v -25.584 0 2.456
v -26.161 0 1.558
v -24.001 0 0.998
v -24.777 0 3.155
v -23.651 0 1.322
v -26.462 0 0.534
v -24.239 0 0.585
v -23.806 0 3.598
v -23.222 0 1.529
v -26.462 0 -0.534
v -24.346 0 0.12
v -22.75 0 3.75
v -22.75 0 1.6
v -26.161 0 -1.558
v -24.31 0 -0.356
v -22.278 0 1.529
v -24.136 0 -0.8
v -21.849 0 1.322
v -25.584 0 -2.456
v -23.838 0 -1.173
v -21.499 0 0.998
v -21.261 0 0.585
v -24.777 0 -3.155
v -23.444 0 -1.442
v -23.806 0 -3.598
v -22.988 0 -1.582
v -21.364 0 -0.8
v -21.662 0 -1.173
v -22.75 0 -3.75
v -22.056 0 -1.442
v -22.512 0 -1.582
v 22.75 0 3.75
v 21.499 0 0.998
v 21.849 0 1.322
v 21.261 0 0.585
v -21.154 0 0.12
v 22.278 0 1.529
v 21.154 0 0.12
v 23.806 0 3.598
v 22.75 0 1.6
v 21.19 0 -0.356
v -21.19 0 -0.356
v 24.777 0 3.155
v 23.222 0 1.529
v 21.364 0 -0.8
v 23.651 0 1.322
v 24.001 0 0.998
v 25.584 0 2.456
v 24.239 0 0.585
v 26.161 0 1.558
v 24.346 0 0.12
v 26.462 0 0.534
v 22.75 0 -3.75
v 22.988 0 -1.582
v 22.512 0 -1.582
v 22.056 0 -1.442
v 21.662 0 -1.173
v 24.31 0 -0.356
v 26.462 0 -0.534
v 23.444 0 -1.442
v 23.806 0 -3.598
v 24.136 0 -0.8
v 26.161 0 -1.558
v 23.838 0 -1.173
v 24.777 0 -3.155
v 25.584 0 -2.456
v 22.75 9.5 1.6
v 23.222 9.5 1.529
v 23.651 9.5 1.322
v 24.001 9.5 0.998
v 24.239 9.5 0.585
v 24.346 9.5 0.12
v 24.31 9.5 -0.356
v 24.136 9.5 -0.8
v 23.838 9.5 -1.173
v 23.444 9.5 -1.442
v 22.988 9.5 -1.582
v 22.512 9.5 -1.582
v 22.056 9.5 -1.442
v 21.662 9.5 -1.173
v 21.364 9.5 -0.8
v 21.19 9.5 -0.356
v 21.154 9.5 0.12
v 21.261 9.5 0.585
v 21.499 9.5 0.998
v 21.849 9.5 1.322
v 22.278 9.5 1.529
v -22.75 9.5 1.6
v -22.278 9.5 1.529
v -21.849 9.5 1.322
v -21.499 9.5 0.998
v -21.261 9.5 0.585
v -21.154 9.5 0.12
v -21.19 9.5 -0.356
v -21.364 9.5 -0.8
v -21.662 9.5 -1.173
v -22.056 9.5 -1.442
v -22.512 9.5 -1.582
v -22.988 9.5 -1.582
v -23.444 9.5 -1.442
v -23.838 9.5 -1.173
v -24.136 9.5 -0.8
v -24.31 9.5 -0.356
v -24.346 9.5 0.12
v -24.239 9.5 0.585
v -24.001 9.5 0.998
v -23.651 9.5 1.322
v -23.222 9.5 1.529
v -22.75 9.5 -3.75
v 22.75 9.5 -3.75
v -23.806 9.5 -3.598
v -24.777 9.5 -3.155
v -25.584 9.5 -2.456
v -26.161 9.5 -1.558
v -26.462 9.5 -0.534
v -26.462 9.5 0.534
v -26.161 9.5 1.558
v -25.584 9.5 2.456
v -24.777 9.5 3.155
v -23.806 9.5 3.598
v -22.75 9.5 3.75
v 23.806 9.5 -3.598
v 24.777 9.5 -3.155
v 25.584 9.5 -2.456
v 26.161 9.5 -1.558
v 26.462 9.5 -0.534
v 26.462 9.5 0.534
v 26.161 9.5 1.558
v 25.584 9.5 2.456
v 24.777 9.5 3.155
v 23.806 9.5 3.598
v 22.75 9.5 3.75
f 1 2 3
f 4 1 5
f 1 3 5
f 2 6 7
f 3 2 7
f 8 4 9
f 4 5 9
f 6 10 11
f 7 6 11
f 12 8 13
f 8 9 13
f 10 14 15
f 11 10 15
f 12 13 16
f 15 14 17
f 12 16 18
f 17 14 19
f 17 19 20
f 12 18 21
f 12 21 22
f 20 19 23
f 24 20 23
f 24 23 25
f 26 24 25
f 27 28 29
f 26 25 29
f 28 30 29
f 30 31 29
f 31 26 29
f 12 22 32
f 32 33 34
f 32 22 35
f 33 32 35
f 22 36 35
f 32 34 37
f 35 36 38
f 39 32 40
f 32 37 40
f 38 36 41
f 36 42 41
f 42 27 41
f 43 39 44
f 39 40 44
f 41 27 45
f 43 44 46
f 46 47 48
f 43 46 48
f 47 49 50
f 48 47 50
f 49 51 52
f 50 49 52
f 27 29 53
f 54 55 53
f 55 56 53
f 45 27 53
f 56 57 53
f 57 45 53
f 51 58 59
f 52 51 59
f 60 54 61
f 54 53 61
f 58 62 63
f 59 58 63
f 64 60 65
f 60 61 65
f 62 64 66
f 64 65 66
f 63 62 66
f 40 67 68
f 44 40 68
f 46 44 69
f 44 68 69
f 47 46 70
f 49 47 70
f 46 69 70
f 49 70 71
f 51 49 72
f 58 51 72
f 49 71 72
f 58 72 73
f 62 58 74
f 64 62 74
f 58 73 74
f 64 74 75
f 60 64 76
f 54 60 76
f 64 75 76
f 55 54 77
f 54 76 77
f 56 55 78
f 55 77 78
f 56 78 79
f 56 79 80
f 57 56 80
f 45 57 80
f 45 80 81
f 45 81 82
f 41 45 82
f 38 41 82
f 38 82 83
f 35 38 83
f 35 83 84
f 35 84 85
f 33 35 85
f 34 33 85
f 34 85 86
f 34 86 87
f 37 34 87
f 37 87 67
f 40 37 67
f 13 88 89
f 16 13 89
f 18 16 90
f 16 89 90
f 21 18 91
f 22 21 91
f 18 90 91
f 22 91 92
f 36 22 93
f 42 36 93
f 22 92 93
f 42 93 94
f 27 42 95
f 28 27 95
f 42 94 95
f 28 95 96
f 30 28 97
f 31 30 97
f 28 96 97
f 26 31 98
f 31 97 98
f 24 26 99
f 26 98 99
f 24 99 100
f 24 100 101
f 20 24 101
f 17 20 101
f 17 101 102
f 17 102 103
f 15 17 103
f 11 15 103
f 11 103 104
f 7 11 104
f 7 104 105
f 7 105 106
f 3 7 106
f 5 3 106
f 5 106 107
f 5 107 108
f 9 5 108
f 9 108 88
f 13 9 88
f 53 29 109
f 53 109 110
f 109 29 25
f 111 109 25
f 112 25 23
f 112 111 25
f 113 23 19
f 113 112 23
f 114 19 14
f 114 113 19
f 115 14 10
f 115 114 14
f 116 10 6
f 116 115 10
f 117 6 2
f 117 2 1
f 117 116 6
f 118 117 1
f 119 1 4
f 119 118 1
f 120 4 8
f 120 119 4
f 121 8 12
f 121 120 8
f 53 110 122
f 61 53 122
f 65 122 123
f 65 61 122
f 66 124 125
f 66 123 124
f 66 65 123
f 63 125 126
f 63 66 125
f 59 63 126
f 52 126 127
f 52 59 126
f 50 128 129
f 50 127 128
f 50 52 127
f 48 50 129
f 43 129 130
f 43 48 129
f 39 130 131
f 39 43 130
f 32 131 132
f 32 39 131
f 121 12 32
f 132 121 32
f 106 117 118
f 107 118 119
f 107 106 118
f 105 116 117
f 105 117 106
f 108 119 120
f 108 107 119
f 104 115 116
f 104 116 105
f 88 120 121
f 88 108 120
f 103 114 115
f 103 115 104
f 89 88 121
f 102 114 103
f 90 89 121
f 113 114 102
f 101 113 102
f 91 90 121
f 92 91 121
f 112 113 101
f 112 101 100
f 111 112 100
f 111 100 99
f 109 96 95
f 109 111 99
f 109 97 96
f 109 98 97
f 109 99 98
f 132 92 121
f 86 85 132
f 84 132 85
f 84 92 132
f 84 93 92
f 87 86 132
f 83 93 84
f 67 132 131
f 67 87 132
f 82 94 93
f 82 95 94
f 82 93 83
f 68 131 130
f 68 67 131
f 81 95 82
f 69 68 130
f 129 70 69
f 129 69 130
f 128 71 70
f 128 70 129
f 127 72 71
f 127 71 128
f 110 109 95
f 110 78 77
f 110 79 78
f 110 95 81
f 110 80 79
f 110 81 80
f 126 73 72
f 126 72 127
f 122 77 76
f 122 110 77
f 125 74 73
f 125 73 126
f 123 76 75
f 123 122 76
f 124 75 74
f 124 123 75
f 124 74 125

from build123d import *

# Parameters (mm, degrees)
CROQUIS1_W              = 53
CROQUIS1_H              = 7.5
SALIENTE_EXTRUIR1_DEPTH = 9.5
REDONDEO1_RADIUS        = 3.75
REDONDEO1_LENGTH        = 9.5
REDONDEO3_RADIUS        = 3.75
REDONDEO3_LENGTH        = 9.5
CROQUIS2_R              = 1.6
CORTAR_EXTRUIR1_DEPTH   = 29.400044014


with BuildPart() as part:
    # Croquis1 → Saliente-Extruir1 (new body)
    with BuildSketch(Plane(origin=(0, 0, 0), x_dir=(1, 0, 0), z_dir=(0, 1, 0))):
        Rectangle(CROQUIS1_W, CROQUIS1_H)
    extrude(amount=SALIENTE_EXTRUIR1_DEPTH)

    # Redondeo1: full round fillet: the end face becomes a half cylinder, R = half its width
    redondeo1_face = Plane((26.5, 4.75, 0), x_dir=(0, -1, 0), z_dir=(1, 0, 0))  # on the end face: x along it, z out of the body
    redondeo1_slab = redondeo1_face.offset(-REDONDEO1_RADIUS / 2) * Box(REDONDEO1_LENGTH, 2 * REDONDEO1_RADIUS, REDONDEO1_RADIUS, mode=Mode.PRIVATE)  # the body's end, R deep
    redondeo1_round = Plane((22.75, 4.75, 0), x_dir=(1, 0, 0), z_dir=(0, -1, 0)) * Cylinder(REDONDEO1_RADIUS, REDONDEO1_LENGTH, mode=Mode.PRIVATE)  # its axis R under the face
    add(redondeo1_slab - redondeo1_round, mode=Mode.SUBTRACT)

    # Redondeo3: full round fillet: the end face becomes a half cylinder, R = half its width
    redondeo3_face = Plane((-26.5, 4.75, 0), x_dir=(0, 1, 0), z_dir=(-1, 0, 0))  # on the end face: x along it, z out of the body
    redondeo3_slab = redondeo3_face.offset(-REDONDEO3_RADIUS / 2) * Box(REDONDEO3_LENGTH, 2 * REDONDEO3_RADIUS, REDONDEO3_RADIUS, mode=Mode.PRIVATE)  # the body's end, R deep
    redondeo3_round = Plane((-22.75, 4.75, 0), x_dir=(-1, 0, 0), z_dir=(0, 1, 0)) * Cylinder(REDONDEO3_RADIUS, REDONDEO3_LENGTH, mode=Mode.PRIVATE)  # its axis R under the face
    add(redondeo3_slab - redondeo3_round, mode=Mode.SUBTRACT)

    # Croquis2 → Cortar-Extruir1 (cut, through all)
    with BuildSketch(Plane(origin=(0, 9.5, 0), x_dir=(1, 0, 0), z_dir=(0, 1, 0))):
        with Locations(Location((-22.75, 0, 0), (0, 0, 270))):
            Circle(CROQUIS2_R)
        with Locations(Location((22.75, 0, 0), (0, 0, 270))):
            Circle(CROQUIS2_R)
    extrude(amount=-CORTAR_EXTRUIR1_DEPTH, mode=Mode.SUBTRACT)


solid = part.part
